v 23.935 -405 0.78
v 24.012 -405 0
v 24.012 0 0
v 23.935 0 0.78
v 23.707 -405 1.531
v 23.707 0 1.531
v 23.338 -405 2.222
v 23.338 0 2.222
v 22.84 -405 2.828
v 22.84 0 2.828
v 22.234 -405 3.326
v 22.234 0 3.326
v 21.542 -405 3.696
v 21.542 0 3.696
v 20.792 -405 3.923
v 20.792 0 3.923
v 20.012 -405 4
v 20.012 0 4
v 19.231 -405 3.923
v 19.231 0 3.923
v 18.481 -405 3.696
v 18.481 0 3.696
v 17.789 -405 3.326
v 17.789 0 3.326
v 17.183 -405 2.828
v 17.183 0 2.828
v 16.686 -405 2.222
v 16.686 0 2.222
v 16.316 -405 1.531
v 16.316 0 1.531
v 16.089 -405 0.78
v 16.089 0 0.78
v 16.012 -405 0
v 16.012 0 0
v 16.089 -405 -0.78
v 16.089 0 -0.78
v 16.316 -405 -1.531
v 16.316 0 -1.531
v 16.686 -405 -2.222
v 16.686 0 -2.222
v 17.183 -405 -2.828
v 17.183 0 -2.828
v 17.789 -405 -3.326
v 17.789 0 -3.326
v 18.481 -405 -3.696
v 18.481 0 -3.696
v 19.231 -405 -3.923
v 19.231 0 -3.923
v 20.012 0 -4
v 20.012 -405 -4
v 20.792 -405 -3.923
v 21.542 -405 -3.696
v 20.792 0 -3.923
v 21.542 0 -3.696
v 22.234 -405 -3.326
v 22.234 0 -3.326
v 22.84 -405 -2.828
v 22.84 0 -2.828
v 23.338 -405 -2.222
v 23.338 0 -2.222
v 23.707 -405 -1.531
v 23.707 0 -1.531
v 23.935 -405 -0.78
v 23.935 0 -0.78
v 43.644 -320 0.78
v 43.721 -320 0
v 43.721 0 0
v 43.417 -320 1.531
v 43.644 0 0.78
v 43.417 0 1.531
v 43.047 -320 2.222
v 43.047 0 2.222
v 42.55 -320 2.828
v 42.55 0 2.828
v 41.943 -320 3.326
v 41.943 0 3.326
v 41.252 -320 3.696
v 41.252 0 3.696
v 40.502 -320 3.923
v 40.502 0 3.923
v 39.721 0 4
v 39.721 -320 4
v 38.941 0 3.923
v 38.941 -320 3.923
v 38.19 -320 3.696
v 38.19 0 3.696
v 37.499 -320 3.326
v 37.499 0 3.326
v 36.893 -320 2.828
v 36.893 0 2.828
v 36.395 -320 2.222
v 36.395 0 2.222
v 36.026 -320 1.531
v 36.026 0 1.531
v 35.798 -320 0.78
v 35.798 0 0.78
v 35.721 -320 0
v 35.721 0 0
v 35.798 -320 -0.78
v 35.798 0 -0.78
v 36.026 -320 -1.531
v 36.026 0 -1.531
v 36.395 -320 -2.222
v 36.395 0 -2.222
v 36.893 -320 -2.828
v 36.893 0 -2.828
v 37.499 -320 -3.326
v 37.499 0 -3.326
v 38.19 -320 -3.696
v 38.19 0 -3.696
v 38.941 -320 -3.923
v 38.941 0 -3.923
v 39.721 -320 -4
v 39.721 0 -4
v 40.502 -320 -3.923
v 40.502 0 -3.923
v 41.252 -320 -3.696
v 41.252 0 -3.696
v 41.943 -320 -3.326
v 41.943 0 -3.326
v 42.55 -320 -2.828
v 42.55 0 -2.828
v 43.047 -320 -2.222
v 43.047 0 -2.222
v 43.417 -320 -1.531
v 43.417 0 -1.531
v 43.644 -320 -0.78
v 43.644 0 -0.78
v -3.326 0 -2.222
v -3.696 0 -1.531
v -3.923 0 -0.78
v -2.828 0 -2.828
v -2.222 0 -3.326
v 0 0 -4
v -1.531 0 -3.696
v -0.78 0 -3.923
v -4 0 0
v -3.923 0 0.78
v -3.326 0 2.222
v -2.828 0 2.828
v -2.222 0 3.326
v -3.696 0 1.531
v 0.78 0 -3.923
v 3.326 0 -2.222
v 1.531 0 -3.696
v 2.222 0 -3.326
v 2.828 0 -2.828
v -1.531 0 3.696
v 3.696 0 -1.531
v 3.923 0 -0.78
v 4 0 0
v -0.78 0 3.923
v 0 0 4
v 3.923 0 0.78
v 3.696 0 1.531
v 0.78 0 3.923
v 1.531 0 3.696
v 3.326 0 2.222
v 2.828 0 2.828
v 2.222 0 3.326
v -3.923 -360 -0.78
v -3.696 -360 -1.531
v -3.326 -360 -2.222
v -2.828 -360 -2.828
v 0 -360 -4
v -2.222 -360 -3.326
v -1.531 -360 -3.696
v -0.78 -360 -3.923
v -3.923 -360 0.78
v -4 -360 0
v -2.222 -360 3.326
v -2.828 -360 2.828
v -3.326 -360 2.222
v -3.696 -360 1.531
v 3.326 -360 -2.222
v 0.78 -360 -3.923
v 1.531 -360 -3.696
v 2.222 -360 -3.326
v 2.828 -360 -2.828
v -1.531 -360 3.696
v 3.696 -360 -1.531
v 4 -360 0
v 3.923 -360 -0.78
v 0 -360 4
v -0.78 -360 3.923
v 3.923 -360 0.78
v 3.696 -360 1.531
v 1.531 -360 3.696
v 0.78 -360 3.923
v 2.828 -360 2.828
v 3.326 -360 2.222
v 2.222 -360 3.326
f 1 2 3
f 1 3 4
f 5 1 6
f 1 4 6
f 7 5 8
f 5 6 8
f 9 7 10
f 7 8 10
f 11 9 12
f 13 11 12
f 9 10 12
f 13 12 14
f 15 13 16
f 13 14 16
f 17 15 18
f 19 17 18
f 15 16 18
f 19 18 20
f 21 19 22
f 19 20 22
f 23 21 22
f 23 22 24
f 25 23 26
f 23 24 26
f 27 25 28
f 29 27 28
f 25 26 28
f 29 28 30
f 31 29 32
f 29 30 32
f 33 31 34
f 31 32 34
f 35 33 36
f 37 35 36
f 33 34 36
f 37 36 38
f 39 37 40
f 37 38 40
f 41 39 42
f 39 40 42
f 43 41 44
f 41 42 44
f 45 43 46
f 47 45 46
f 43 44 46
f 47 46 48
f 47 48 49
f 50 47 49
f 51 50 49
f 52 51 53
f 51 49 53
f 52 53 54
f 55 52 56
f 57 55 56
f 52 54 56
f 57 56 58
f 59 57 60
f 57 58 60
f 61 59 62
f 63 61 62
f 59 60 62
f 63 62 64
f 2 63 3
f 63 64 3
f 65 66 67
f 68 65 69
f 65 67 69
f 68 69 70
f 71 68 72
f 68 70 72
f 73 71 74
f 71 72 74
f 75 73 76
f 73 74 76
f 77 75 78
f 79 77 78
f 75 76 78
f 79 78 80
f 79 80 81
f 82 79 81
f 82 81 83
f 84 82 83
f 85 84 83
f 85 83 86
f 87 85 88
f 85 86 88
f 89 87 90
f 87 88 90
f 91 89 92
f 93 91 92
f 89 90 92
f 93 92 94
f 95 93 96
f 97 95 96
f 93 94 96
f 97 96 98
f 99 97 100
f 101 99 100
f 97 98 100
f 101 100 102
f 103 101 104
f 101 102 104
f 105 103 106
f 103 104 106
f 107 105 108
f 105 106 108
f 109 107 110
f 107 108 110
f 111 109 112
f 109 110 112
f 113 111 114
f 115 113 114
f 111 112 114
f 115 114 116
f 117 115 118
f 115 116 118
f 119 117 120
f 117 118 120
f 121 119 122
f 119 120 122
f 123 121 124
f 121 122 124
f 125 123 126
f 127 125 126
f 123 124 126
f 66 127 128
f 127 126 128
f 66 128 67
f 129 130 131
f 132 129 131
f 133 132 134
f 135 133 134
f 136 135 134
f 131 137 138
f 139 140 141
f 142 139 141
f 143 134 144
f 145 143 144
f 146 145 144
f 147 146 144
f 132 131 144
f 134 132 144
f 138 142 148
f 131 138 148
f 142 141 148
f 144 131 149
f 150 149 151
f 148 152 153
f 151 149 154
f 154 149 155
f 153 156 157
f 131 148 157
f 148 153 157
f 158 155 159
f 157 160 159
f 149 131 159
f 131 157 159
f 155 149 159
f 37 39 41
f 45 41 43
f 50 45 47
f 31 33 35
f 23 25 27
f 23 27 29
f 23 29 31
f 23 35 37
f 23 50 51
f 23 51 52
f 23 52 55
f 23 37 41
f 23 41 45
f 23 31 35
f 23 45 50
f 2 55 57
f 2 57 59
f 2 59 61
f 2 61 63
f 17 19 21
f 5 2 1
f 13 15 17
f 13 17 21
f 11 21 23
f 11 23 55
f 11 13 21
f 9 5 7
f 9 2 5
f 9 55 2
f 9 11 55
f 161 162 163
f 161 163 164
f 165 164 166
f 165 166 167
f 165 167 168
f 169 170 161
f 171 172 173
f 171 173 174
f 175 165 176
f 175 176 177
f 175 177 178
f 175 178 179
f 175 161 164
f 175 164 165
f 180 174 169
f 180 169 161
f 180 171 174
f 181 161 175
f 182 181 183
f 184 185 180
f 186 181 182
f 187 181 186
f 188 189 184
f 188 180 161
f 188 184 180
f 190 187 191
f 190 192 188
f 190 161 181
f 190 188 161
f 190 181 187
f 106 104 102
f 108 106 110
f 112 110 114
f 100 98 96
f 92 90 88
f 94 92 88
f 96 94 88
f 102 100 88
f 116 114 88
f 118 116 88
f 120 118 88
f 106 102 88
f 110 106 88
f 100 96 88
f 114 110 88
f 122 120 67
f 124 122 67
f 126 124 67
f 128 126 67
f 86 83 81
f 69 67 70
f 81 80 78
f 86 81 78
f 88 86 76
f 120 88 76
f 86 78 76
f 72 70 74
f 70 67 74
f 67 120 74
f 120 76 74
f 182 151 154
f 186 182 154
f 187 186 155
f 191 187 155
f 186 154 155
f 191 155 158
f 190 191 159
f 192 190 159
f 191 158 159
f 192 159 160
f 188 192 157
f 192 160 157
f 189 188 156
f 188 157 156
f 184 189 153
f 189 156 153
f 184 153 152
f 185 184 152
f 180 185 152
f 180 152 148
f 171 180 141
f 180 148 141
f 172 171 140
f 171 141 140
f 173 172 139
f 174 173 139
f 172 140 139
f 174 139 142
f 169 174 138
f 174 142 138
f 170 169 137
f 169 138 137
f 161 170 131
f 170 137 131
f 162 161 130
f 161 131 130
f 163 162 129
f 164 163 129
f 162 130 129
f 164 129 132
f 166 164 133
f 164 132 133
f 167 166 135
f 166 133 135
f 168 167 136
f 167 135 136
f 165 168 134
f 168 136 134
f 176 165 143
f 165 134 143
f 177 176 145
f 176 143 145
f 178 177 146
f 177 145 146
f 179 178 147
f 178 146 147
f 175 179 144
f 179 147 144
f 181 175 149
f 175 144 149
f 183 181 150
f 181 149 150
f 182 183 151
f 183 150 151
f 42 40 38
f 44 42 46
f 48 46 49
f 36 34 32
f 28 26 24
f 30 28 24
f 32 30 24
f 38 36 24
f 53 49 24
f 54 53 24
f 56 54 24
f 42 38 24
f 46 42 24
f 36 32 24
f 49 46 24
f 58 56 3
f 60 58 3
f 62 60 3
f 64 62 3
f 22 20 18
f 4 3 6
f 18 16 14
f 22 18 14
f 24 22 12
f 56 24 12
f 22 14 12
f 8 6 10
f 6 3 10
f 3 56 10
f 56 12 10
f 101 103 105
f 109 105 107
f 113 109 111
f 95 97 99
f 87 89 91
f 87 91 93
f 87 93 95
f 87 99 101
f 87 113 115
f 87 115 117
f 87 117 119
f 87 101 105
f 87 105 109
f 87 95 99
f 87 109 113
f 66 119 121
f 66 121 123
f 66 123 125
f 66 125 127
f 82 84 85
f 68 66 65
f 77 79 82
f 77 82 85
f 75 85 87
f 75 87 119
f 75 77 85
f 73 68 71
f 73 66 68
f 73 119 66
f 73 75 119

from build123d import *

# Parameters (mm, degrees)
F0_R     = 4
F1_DEPTH = 360
F2_R     = 4
F3_DEPTH = 405
F4_R     = 4
F5_DEPTH = 320


# Not quite as in the source:
# - a feature of the source that left no trace in its solid (it failed there, or was rolled back) is left out


with BuildPart() as f1:
    # F0 (on Front) → F1 (new body)
    with BuildSketch(Plane.XZ):
        Circle(F0_R)
    extrude(amount=F1_DEPTH)


with BuildPart() as f3:
    # F2 (on Front) → F3 (new body)
    with BuildSketch(Plane.XZ):
        with Locations((20.0116876513, 0)):
            Circle(F2_R)
    extrude(amount=F3_DEPTH)


with BuildPart() as f5:
    # F4 (on Front) → F5 (new body)
    with BuildSketch(Plane.XZ):
        with Locations((39.7211872041, 0)):
            Circle(F4_R)
    extrude(amount=F5_DEPTH)


solid = Compound([f1.part, f3.part, f5.part])
